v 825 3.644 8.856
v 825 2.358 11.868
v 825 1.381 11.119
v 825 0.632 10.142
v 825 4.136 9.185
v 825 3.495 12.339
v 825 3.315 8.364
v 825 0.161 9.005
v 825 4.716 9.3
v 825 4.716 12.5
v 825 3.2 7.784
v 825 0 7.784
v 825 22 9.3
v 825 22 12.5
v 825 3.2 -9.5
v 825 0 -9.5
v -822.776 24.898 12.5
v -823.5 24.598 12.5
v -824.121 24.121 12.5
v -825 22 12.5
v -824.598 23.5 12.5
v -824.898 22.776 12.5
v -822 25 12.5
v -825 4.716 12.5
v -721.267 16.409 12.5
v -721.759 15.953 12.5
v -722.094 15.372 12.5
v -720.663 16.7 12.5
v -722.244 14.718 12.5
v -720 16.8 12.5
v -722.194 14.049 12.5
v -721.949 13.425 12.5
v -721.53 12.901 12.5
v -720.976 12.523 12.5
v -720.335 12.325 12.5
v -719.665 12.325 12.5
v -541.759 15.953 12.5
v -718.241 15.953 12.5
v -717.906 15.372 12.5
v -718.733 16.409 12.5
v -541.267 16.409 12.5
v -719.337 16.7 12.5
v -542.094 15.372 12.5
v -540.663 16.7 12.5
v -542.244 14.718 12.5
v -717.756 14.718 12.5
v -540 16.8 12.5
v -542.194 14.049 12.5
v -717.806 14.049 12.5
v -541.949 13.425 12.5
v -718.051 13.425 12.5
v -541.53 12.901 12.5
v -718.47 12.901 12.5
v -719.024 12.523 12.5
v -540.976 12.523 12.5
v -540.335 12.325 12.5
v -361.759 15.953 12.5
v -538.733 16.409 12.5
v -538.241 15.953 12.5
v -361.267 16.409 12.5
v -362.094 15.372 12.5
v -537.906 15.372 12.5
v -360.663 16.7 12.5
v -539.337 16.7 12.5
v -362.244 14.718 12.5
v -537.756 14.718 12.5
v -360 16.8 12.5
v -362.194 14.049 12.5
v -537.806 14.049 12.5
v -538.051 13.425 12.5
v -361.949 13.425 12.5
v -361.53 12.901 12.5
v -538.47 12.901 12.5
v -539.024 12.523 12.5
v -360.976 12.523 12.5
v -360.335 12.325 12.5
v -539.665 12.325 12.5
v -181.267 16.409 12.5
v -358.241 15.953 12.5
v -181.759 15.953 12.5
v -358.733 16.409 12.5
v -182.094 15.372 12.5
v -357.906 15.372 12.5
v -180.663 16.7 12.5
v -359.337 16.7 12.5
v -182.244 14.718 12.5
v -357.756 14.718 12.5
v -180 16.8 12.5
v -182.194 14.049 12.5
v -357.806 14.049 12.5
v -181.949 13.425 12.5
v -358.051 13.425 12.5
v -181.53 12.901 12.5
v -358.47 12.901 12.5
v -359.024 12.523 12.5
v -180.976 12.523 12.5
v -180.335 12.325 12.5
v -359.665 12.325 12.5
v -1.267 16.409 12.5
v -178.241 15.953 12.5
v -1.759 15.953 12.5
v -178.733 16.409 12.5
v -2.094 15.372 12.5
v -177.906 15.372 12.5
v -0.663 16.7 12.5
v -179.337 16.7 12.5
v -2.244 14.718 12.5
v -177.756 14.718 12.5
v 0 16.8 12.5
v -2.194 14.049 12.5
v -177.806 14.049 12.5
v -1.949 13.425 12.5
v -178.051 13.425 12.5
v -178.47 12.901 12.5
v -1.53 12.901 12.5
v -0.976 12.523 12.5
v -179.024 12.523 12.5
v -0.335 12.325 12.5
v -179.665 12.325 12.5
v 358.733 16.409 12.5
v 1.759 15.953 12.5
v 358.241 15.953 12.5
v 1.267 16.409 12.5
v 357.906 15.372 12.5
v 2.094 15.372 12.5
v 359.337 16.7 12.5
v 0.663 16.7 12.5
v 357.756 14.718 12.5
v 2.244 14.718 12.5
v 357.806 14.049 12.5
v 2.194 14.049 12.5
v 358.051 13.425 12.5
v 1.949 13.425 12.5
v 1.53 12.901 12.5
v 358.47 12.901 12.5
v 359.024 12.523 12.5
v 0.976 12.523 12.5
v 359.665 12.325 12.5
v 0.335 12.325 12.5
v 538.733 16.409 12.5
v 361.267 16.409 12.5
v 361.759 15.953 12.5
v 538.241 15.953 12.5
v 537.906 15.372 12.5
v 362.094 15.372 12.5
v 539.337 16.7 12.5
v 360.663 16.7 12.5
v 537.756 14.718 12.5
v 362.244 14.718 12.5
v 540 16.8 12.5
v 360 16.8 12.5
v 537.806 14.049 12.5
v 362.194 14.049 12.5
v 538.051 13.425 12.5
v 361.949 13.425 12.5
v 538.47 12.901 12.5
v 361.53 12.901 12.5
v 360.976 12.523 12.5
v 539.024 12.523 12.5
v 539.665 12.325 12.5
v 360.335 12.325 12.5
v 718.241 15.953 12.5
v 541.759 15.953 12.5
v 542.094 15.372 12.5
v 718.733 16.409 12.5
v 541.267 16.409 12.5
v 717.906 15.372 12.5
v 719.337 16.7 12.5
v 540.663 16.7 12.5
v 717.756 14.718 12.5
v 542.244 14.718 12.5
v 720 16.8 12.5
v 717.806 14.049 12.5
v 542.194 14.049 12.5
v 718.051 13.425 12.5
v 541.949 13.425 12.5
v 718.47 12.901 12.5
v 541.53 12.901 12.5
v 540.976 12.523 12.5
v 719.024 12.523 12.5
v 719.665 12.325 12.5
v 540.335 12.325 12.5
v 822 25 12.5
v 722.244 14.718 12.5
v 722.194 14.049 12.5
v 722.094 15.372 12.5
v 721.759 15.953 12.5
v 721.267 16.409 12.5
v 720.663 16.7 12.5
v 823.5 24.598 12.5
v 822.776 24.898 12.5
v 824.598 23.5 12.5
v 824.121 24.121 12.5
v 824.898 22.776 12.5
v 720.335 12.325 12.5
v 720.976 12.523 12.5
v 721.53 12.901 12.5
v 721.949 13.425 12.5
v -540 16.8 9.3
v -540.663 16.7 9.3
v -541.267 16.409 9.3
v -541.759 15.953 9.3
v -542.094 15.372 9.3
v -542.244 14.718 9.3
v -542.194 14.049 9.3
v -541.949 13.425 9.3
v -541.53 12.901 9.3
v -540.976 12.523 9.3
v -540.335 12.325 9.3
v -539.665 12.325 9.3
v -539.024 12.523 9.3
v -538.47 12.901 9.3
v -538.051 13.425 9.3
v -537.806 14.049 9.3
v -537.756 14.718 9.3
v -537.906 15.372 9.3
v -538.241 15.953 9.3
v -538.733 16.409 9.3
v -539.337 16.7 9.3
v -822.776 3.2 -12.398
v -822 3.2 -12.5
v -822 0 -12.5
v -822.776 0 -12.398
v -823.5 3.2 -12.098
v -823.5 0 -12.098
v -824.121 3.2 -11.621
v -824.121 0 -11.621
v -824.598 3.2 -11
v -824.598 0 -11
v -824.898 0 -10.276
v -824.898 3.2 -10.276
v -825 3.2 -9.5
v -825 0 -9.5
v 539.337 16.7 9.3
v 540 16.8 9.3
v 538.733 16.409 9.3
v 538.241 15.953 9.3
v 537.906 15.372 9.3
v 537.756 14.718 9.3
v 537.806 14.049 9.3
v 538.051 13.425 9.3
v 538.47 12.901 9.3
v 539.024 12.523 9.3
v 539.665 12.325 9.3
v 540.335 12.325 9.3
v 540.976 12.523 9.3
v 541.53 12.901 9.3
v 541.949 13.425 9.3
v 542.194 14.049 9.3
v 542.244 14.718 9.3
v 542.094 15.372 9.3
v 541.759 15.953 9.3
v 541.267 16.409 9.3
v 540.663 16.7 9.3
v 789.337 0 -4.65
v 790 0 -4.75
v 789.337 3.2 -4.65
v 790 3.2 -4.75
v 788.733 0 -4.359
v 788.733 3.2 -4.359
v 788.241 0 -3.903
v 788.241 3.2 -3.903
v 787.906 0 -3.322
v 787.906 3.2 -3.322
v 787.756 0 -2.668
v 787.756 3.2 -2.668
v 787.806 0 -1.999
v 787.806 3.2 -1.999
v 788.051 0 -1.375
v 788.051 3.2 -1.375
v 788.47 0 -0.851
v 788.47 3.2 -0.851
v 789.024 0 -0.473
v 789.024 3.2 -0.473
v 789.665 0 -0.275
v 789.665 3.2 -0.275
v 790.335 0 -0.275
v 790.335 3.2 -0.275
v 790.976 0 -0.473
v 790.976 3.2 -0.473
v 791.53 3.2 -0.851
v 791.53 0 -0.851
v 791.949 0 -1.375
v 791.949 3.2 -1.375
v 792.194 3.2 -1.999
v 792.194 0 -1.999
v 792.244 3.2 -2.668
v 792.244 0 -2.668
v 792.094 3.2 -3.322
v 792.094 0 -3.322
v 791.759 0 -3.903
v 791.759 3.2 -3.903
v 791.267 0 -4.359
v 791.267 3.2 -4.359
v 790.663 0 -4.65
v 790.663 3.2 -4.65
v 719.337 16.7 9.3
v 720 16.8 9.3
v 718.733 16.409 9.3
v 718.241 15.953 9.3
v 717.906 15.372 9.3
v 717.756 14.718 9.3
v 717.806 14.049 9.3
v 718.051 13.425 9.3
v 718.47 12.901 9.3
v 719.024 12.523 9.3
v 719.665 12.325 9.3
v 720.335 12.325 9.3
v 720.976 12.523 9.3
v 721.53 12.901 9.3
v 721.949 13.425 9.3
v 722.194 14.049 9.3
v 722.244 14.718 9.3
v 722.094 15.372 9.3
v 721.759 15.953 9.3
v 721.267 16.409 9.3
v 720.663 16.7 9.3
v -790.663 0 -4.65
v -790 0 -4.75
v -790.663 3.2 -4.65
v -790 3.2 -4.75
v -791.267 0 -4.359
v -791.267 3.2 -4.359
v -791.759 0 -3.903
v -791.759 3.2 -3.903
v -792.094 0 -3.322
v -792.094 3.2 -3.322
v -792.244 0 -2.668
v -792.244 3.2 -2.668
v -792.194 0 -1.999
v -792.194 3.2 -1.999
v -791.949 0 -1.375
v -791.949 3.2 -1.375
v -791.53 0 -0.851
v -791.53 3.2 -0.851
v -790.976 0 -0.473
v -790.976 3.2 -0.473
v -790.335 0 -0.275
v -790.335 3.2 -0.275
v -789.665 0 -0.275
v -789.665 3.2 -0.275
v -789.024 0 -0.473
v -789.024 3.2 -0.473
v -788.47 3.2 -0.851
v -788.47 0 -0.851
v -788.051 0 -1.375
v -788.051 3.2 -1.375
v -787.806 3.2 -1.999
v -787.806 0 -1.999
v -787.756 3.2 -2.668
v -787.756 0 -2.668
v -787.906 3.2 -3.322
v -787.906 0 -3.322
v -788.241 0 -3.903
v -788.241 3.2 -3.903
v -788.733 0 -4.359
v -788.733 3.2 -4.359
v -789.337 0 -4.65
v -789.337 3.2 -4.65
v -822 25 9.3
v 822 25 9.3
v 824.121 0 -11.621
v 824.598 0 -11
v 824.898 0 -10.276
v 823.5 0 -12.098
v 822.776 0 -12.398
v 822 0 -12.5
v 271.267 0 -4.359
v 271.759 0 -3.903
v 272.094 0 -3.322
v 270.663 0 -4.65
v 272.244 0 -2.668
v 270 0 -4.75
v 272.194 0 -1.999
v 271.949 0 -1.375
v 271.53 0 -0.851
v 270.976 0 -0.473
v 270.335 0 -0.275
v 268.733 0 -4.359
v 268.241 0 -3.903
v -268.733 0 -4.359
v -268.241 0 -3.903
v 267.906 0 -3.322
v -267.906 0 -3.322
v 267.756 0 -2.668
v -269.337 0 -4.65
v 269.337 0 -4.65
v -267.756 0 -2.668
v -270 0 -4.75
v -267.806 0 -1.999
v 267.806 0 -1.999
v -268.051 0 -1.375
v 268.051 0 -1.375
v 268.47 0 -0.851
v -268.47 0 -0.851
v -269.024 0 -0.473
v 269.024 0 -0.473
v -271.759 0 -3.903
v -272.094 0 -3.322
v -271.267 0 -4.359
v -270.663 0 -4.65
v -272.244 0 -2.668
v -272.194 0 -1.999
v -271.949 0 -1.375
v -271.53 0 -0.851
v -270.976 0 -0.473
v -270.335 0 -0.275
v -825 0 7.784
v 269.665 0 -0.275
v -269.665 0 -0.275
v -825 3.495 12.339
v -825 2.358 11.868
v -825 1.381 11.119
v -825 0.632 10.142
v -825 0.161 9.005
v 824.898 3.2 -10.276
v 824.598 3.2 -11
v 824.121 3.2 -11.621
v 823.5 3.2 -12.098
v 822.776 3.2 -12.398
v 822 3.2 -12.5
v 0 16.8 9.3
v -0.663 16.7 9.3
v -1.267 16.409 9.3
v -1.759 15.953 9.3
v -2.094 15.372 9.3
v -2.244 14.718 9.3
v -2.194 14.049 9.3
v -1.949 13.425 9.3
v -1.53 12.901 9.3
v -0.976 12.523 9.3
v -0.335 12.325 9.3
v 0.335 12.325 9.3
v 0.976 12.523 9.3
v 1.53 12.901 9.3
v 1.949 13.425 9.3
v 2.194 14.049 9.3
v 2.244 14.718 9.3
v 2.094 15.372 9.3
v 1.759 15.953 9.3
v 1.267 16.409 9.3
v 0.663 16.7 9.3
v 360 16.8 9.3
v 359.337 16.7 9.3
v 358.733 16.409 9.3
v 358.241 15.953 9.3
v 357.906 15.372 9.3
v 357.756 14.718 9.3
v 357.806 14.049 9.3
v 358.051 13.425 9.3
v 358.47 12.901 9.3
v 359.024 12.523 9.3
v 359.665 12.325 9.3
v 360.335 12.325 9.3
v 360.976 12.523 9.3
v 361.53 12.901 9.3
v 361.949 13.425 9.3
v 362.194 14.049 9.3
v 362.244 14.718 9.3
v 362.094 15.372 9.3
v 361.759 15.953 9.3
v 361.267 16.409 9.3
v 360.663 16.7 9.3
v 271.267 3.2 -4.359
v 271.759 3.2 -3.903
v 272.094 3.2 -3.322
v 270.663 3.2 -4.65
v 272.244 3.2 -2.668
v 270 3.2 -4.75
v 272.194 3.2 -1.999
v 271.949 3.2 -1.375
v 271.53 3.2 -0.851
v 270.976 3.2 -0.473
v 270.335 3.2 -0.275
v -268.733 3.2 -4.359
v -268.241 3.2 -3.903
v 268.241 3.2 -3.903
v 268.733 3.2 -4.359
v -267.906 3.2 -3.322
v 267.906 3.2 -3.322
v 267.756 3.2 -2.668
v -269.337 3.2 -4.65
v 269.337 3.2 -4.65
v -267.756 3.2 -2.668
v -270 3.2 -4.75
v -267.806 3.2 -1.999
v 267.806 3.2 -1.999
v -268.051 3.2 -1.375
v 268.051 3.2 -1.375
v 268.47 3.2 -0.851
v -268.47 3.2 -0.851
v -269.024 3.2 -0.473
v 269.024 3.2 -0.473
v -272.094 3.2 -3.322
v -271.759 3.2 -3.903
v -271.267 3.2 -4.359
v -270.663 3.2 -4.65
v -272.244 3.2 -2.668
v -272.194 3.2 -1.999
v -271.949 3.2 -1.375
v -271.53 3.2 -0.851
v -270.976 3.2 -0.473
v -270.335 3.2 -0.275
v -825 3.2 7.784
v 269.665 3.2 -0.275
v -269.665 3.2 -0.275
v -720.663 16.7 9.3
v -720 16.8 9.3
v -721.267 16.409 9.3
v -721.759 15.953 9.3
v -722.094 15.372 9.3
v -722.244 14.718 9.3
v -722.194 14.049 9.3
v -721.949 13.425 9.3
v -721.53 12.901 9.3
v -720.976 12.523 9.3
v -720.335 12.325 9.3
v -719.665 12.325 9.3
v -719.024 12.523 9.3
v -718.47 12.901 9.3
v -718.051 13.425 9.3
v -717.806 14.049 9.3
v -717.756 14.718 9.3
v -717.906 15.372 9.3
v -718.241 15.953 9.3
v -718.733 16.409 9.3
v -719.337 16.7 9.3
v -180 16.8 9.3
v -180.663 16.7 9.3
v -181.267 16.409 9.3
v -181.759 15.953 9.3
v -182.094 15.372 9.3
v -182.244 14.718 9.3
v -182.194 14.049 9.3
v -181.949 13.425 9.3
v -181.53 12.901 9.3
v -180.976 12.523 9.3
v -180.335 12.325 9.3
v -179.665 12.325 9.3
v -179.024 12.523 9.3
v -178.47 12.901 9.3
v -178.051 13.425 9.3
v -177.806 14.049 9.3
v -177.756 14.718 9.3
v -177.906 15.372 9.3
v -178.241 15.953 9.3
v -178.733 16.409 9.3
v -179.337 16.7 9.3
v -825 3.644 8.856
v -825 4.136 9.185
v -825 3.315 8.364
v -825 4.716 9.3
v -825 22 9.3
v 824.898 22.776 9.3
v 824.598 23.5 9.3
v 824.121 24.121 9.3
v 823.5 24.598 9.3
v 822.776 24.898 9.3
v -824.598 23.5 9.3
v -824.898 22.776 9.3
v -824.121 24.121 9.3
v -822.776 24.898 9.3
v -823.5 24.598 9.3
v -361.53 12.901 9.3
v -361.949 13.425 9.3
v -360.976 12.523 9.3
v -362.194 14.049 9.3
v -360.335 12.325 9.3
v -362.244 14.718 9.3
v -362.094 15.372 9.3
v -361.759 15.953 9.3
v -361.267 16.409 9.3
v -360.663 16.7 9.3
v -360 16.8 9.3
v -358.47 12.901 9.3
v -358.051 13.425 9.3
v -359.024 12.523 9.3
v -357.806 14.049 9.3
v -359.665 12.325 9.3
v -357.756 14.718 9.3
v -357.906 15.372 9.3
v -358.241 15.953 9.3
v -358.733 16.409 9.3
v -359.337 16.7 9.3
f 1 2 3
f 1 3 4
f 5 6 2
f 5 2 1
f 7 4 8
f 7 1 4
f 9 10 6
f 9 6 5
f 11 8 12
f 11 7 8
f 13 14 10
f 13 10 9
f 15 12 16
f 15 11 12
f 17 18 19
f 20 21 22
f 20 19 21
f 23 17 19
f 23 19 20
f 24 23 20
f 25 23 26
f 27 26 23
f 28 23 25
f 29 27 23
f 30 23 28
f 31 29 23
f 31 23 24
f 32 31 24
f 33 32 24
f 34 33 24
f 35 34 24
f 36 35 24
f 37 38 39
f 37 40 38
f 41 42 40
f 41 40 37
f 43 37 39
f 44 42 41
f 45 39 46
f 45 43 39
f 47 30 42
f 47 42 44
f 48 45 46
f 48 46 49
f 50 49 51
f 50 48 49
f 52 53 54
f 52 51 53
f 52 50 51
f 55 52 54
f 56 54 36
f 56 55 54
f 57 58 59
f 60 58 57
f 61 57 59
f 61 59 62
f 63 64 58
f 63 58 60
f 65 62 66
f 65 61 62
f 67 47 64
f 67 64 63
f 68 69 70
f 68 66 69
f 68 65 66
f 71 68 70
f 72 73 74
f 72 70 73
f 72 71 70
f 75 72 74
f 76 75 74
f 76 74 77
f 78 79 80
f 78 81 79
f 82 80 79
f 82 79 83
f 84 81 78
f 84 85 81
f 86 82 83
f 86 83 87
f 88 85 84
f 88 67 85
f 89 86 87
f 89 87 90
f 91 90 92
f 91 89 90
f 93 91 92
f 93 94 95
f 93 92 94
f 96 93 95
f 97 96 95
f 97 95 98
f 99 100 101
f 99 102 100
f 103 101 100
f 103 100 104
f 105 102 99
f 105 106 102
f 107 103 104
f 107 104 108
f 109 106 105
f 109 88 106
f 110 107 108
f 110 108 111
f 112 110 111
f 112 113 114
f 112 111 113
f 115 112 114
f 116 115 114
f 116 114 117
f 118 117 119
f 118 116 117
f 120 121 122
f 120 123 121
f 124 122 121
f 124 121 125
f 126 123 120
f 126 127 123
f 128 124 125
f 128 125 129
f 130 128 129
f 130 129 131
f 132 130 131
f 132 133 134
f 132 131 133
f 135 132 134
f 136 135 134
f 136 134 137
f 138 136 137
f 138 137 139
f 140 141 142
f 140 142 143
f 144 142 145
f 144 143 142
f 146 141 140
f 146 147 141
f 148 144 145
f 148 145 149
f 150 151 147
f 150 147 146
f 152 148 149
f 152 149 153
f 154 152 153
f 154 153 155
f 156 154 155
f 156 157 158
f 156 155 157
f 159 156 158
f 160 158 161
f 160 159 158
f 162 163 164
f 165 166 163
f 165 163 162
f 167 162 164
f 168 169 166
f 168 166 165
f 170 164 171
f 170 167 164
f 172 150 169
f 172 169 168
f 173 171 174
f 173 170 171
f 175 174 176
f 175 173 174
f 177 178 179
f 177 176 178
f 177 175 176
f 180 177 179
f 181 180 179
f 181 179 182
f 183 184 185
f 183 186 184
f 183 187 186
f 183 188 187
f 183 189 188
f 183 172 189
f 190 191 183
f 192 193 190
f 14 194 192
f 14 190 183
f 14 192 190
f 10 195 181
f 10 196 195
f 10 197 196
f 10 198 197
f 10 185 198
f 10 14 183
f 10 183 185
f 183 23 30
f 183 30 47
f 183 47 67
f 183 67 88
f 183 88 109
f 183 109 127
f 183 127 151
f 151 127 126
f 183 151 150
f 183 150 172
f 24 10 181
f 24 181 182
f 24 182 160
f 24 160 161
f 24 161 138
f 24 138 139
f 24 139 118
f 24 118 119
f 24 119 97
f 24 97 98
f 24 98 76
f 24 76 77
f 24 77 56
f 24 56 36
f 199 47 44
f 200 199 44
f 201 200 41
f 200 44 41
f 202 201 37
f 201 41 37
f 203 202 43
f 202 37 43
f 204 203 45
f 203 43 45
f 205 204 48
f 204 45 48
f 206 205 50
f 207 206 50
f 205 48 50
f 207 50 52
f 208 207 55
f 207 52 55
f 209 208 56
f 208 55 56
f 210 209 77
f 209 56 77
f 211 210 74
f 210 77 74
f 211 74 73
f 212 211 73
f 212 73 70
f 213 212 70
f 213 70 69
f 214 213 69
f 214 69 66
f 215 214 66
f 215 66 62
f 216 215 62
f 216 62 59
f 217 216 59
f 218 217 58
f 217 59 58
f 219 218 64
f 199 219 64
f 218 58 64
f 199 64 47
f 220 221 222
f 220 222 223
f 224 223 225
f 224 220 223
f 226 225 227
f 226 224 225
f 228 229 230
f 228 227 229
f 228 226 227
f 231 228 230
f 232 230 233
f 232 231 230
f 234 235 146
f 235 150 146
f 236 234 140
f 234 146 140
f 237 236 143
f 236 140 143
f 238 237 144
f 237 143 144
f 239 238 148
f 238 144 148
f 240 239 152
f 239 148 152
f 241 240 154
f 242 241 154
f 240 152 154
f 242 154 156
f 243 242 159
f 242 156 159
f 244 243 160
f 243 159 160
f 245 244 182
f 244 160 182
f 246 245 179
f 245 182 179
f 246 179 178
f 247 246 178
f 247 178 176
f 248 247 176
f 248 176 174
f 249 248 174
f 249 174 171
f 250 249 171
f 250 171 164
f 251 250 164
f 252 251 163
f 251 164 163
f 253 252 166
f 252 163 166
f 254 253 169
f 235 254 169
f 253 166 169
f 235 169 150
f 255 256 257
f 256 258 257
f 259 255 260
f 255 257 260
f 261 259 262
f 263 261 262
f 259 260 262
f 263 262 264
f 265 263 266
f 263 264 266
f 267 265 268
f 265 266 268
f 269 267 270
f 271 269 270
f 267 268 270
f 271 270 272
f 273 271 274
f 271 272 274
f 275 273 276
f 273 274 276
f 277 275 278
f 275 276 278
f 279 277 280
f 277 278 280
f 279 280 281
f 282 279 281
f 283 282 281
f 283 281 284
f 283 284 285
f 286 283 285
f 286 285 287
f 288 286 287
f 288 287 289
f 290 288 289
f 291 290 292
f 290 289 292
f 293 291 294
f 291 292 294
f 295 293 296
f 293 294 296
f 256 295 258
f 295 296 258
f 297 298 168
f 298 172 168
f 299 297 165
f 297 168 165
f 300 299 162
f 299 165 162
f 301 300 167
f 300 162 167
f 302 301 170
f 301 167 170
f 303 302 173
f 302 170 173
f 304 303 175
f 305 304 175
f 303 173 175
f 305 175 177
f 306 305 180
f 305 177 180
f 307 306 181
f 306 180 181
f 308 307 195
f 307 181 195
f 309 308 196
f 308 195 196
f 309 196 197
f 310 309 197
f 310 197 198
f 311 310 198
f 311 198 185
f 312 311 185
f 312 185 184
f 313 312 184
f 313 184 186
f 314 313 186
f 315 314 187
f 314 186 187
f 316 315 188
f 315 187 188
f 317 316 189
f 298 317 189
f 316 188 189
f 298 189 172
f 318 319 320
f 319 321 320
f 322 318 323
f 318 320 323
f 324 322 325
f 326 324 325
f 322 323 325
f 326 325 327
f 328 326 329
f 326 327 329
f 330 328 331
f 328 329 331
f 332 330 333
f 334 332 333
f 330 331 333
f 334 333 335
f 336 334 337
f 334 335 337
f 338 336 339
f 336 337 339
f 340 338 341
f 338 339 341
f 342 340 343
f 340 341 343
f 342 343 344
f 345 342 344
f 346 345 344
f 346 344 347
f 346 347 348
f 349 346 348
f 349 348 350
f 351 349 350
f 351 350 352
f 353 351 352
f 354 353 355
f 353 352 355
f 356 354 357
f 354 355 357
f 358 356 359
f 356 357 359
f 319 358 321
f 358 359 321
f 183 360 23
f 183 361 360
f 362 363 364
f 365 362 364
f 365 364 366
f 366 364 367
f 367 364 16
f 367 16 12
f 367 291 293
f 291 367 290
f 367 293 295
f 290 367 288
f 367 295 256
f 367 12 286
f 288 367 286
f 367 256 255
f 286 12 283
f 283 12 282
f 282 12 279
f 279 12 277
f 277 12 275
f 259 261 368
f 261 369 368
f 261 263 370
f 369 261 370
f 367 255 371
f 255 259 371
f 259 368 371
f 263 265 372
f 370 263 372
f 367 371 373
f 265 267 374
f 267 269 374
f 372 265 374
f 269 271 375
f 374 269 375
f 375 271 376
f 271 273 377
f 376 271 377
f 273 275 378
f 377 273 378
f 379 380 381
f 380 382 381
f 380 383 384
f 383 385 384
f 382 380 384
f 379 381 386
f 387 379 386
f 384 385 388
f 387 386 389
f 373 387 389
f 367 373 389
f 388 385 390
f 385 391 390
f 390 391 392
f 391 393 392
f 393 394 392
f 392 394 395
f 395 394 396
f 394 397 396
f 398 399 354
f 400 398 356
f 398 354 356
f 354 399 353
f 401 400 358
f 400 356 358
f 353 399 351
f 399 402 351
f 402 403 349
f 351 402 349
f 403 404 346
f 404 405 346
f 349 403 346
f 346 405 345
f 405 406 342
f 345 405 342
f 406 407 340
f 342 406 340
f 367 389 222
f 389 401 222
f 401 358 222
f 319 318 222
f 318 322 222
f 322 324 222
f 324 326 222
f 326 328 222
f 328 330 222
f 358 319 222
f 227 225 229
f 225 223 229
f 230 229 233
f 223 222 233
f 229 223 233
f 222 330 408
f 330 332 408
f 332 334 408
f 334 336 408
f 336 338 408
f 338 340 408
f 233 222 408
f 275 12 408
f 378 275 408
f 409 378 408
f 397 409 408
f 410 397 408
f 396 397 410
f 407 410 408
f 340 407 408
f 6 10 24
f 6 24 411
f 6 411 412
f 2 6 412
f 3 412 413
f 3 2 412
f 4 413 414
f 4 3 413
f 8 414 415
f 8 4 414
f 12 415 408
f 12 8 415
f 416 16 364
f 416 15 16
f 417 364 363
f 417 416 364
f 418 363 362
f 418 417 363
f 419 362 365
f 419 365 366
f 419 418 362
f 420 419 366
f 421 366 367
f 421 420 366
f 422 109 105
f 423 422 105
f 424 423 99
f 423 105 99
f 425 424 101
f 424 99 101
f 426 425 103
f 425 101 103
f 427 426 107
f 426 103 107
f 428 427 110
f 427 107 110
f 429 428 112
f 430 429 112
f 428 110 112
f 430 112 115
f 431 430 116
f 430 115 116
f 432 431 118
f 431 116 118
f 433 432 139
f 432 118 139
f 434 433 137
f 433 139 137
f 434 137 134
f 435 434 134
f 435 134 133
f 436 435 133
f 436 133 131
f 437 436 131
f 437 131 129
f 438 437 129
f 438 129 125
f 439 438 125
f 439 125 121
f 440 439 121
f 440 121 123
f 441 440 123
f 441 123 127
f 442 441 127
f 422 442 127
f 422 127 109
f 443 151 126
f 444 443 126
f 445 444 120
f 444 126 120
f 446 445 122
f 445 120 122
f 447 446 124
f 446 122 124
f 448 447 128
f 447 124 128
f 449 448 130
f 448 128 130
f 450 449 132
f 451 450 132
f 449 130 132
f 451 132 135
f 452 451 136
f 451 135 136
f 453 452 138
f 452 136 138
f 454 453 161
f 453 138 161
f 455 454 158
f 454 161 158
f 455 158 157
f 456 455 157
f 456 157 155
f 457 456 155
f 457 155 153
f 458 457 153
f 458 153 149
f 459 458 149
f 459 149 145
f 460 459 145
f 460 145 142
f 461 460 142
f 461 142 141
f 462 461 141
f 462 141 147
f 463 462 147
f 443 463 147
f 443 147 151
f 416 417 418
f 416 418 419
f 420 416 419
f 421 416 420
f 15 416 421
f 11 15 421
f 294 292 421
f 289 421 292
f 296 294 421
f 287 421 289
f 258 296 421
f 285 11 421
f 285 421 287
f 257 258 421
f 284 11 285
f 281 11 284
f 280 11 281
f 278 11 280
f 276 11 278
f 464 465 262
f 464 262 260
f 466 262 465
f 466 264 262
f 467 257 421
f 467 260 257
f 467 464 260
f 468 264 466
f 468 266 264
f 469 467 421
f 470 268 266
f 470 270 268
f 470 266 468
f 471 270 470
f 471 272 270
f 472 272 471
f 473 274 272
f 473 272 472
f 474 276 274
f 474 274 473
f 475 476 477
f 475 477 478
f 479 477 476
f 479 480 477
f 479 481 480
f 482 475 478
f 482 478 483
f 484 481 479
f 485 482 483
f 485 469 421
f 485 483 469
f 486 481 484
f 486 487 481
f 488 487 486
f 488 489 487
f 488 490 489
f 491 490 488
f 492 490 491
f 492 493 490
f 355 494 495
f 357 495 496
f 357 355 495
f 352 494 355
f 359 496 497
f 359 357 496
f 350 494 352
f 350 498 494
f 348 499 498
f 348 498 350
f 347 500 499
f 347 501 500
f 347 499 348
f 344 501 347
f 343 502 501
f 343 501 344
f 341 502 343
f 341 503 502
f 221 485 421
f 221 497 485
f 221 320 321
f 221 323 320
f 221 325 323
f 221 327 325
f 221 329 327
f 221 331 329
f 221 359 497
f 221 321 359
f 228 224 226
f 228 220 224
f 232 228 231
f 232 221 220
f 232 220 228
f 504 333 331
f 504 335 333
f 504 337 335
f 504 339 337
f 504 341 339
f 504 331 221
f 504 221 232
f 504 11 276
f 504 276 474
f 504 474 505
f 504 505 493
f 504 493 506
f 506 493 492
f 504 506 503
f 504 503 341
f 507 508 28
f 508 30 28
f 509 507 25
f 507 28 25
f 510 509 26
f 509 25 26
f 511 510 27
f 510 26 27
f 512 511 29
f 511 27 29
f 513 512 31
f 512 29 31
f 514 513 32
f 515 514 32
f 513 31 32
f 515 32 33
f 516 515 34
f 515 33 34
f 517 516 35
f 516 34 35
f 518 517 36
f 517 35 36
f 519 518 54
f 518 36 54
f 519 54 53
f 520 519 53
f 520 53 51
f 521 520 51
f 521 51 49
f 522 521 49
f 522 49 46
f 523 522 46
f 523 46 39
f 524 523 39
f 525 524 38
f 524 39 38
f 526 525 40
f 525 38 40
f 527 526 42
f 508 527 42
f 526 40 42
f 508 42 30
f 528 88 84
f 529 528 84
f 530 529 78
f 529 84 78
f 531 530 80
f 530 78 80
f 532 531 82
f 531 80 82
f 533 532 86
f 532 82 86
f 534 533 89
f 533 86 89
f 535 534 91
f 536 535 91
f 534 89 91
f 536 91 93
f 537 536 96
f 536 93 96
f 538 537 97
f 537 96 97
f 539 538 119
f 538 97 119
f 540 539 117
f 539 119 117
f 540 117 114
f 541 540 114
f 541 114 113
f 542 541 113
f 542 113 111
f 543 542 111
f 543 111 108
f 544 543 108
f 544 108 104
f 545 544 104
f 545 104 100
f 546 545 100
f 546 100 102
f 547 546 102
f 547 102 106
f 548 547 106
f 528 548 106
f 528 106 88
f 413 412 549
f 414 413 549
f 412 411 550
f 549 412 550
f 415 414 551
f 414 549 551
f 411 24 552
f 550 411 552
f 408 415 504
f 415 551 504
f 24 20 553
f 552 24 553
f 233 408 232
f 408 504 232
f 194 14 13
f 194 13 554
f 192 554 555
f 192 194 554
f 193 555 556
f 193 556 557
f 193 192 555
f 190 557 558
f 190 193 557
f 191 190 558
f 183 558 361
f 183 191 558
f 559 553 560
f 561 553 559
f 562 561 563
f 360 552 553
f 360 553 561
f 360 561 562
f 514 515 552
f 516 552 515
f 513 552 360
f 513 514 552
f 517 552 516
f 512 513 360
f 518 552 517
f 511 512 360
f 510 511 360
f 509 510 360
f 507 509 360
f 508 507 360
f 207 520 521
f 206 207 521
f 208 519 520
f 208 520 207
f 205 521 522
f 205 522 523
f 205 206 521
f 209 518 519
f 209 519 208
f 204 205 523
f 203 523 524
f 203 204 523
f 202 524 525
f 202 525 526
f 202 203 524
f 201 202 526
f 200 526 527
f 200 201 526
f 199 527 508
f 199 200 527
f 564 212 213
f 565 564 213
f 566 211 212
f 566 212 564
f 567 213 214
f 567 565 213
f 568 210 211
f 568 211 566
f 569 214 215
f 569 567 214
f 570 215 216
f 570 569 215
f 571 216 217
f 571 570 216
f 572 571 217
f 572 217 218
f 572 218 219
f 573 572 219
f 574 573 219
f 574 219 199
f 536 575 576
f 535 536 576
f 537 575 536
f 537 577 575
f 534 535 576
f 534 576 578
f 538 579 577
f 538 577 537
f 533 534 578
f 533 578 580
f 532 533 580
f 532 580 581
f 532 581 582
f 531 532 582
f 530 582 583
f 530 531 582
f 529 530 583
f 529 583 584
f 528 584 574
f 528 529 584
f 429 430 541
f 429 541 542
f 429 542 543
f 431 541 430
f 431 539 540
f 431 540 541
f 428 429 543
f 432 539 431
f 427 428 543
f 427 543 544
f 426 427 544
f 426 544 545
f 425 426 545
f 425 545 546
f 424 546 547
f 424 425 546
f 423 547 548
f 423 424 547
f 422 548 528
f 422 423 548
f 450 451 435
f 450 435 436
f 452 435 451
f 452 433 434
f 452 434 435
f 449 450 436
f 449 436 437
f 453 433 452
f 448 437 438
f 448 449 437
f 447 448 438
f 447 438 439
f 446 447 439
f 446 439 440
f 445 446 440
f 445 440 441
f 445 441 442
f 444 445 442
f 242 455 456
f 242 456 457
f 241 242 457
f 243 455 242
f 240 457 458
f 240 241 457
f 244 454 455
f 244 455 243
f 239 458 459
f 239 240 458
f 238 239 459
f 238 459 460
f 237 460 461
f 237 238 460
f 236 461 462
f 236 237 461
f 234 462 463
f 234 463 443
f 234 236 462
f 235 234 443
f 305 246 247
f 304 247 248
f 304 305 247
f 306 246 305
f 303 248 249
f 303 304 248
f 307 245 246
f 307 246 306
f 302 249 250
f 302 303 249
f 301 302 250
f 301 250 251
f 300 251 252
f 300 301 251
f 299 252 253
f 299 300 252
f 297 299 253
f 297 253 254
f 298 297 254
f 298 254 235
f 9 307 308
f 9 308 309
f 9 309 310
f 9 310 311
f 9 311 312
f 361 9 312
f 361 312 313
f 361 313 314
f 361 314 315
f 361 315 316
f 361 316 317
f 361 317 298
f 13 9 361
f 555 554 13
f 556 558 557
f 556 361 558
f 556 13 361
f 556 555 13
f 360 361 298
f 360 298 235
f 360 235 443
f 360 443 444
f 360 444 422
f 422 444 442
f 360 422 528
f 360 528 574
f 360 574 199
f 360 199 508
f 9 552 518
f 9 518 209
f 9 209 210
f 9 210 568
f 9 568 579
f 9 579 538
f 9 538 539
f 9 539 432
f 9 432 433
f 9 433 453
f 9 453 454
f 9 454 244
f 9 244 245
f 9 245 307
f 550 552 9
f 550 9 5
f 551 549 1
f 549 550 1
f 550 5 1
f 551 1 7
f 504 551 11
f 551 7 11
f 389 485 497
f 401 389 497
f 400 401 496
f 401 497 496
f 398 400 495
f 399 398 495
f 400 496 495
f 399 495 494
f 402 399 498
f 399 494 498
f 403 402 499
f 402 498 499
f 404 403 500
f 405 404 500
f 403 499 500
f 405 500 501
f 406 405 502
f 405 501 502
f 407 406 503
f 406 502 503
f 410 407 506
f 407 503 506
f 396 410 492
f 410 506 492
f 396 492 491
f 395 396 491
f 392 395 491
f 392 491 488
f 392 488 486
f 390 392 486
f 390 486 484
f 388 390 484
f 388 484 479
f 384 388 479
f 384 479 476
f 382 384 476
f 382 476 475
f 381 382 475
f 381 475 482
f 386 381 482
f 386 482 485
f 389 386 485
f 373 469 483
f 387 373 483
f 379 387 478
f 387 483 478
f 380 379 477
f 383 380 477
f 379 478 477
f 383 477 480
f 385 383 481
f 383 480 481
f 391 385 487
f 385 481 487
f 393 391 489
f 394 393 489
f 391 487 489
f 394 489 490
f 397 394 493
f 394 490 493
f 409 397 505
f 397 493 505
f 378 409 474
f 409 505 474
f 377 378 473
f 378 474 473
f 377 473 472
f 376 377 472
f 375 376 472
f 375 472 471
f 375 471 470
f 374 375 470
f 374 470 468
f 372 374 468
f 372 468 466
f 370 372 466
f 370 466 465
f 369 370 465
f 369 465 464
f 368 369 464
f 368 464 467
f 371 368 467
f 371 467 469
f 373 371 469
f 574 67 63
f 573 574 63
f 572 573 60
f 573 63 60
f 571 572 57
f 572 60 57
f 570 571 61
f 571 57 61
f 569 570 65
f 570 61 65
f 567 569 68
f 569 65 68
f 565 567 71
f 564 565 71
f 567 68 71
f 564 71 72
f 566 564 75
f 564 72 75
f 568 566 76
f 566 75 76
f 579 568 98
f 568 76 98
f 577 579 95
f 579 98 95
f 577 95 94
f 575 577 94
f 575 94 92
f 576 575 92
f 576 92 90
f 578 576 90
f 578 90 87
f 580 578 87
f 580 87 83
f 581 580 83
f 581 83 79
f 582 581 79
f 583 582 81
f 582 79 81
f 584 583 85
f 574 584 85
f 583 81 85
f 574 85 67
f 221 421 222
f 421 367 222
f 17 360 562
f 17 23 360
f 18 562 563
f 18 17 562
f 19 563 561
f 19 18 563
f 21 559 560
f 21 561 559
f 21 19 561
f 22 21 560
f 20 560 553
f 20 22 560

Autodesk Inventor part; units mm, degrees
ref_plane "YZ Plane" through (0, 0, 0) normal (1, 0, 0) x (0, 1, 0)
ref_plane "XZ Plane" through (0, 0, 0) normal (0, 1, 0) x (-1, 0, 0)
ref_plane "XY Plane" through (0, 0, 0) normal (0, 0, 1) x (1, 0, 0)
sketch "Sketch1" plane through (0, 0, 0) normal (0, 1, 0) x (-1, 0, 0)
  line L0 (825, 12.5) -> (-825, 12.5)
  line L1 (-825, 12.5) -> (-825, -12.5)
  line L2 (-825, -12.5) -> (825, -12.5)
  line L3 (825, -12.5) -> (825, 12.5)
  line L4 (825, 12.5) -> (-825, -12.5) construction
  line L5 (-825, 12.5) -> (825, -12.5) construction
  point P0 (0, 0)
  dimension "d0" = 1650
  dimension "d1" = 25
extrude "Plate1" add sketch "Sketch1" along normal blind 3.2
sketch "Sketch2" plane through (825, 0, 9.3) normal (0, 0, 1) x (1, 0, 0)
  line L0 (-1650, 0) -> (0, 0)
  line L1 (0, 0) -> (0, 25)
  line L2 (0, 25) -> (-1650, 25)
  line L3 (-1650, 25) -> (-1650, 0)
edge flange "Flange1" height 25 angle 90 thickness 3.2 bend radius 1.516 thickness toward (0, 0, 1) relief tear relief width 3.2 relief depth 1.6 edges at (0, 3.2, 12.5) wall of the first edge with corners at (-825, 0, 9.3) (825, 0, 9.3) (825, 25, 9.3) (-825, 25, 9.3)
bend "Bend1"
corner "Corner1"
sketch "Sketch3" plane through (825, 25, 9.3) normal (0, 0, -1) x (-1, 0, 0)
  circle A0 centre (105, -10.45) radius 1.5706 projected
  circle A1 centre (285, -10.45) radius 1.5706 projected
  circle A2 centre (465, -10.45) radius 1.5706 projected
  circle A3 centre (825, -10.45) radius 1.5706 projected
  circle A4 centre (1005, -10.45) radius 1.5706 projected
  circle A5 centre (1185, -10.45) radius 1.5706 projected
  circle A6 centre (1365, -10.45) radius 1.5706 projected
  circle A7 centre (1545, -10.45) radius 1.5706 projected
  point P0 (825, -25)
hole "Hole1" at (540, 14.55, 9.3) at (720, 14.55, 9.3) at (360, 14.55, 9.3) at (0, 14.55, 9.3) at (-180, 14.55, 9.3) at (-360, 14.55, 9.3) at (-540, 14.55, 9.3) at (-720, 14.55, 9.3) direction (0, 0, 1) diameter 4.5 depth 3.2 tip angle 118 clearance for "Countersunk Flat Head Screw ISO 2009/7046" size "M4" standard "ISO"
sketch "Sketch8" plane through (0, 0, 0) normal (0, -1, 0) x (1, 0, 0)
  line L0 (-825, -12.5) -> (825, -12.5) projected
  line L1 (0, -12.5) -> (0, -2.5)
  line L2 (0, -2.5) -> (-270, -2.5)
  line L3 (-270, -2.5) -> (-790, -2.5)
  line L4 (0, -2.5) -> (270, -2.5)
  line L5 (270, -2.5) -> (790, -2.5)
  point P0 (0, 0)
  dimension "d40" = 10
  dimension "d41" = 270
  dimension "d42" = 520
  dimension "d43" = 180
hole "Hole2" at (-790, 0, -2.5) at (-270, 0, -2.5) at (270, 0, -2.5) at (790, 0, -2.5) direction (0, 1, 0) diameter 4.5 depth 3.2 tip angle 118 clearance for "Countersunk Flat Head Screw ISO 2009/7046" size "M4" standard "ISO"
fillet "Corner Round1" radius 3 4 edges at (825, 1.6, -12.5) (-825, 25, 10.9) (825, 25, 10.9) (-825, 1.6, -12.5)
equation "\"d18\" = Thickness"
equation "\"d37\" = Thickness"
equation "\"d2\" = Thickness"
equation "\"d3\" = BendReliefWidth"
equation "\"d4\" = BendReliefDepth"
equation "\"d5\" = MinimumRemnant"
equation "\"d6\" = TransitionRadius"
equation "\"d9\" = BendRadius"
equation "\"d10\" = CornerReliefSize"
equation "\"d11\" = GapSize"
equation "\"d12\" = JacobiRadiusSize"
equation "\"BendReliefWidth\" = Thickness"
equation "\"BendReliefDepth\" = 0.5 * Thickness"
equation "\"CornerReliefSize\" = 4 * Thickness"
equation "\"MinimumRemnant\" = 2 * Thickness"
equation "\"TransitionRadius\" = BendRadius"
equation "\"JacobiRadiusSize\" = BendRadius"
equation "\"GapSize\" = Thickness"
equation "\"Thickness\" = 3.2"
equation "\"BendRadius\" = 1.516"
properties part number "SP39V1 Chapa Acrilico" material "Steel, Carbon"
